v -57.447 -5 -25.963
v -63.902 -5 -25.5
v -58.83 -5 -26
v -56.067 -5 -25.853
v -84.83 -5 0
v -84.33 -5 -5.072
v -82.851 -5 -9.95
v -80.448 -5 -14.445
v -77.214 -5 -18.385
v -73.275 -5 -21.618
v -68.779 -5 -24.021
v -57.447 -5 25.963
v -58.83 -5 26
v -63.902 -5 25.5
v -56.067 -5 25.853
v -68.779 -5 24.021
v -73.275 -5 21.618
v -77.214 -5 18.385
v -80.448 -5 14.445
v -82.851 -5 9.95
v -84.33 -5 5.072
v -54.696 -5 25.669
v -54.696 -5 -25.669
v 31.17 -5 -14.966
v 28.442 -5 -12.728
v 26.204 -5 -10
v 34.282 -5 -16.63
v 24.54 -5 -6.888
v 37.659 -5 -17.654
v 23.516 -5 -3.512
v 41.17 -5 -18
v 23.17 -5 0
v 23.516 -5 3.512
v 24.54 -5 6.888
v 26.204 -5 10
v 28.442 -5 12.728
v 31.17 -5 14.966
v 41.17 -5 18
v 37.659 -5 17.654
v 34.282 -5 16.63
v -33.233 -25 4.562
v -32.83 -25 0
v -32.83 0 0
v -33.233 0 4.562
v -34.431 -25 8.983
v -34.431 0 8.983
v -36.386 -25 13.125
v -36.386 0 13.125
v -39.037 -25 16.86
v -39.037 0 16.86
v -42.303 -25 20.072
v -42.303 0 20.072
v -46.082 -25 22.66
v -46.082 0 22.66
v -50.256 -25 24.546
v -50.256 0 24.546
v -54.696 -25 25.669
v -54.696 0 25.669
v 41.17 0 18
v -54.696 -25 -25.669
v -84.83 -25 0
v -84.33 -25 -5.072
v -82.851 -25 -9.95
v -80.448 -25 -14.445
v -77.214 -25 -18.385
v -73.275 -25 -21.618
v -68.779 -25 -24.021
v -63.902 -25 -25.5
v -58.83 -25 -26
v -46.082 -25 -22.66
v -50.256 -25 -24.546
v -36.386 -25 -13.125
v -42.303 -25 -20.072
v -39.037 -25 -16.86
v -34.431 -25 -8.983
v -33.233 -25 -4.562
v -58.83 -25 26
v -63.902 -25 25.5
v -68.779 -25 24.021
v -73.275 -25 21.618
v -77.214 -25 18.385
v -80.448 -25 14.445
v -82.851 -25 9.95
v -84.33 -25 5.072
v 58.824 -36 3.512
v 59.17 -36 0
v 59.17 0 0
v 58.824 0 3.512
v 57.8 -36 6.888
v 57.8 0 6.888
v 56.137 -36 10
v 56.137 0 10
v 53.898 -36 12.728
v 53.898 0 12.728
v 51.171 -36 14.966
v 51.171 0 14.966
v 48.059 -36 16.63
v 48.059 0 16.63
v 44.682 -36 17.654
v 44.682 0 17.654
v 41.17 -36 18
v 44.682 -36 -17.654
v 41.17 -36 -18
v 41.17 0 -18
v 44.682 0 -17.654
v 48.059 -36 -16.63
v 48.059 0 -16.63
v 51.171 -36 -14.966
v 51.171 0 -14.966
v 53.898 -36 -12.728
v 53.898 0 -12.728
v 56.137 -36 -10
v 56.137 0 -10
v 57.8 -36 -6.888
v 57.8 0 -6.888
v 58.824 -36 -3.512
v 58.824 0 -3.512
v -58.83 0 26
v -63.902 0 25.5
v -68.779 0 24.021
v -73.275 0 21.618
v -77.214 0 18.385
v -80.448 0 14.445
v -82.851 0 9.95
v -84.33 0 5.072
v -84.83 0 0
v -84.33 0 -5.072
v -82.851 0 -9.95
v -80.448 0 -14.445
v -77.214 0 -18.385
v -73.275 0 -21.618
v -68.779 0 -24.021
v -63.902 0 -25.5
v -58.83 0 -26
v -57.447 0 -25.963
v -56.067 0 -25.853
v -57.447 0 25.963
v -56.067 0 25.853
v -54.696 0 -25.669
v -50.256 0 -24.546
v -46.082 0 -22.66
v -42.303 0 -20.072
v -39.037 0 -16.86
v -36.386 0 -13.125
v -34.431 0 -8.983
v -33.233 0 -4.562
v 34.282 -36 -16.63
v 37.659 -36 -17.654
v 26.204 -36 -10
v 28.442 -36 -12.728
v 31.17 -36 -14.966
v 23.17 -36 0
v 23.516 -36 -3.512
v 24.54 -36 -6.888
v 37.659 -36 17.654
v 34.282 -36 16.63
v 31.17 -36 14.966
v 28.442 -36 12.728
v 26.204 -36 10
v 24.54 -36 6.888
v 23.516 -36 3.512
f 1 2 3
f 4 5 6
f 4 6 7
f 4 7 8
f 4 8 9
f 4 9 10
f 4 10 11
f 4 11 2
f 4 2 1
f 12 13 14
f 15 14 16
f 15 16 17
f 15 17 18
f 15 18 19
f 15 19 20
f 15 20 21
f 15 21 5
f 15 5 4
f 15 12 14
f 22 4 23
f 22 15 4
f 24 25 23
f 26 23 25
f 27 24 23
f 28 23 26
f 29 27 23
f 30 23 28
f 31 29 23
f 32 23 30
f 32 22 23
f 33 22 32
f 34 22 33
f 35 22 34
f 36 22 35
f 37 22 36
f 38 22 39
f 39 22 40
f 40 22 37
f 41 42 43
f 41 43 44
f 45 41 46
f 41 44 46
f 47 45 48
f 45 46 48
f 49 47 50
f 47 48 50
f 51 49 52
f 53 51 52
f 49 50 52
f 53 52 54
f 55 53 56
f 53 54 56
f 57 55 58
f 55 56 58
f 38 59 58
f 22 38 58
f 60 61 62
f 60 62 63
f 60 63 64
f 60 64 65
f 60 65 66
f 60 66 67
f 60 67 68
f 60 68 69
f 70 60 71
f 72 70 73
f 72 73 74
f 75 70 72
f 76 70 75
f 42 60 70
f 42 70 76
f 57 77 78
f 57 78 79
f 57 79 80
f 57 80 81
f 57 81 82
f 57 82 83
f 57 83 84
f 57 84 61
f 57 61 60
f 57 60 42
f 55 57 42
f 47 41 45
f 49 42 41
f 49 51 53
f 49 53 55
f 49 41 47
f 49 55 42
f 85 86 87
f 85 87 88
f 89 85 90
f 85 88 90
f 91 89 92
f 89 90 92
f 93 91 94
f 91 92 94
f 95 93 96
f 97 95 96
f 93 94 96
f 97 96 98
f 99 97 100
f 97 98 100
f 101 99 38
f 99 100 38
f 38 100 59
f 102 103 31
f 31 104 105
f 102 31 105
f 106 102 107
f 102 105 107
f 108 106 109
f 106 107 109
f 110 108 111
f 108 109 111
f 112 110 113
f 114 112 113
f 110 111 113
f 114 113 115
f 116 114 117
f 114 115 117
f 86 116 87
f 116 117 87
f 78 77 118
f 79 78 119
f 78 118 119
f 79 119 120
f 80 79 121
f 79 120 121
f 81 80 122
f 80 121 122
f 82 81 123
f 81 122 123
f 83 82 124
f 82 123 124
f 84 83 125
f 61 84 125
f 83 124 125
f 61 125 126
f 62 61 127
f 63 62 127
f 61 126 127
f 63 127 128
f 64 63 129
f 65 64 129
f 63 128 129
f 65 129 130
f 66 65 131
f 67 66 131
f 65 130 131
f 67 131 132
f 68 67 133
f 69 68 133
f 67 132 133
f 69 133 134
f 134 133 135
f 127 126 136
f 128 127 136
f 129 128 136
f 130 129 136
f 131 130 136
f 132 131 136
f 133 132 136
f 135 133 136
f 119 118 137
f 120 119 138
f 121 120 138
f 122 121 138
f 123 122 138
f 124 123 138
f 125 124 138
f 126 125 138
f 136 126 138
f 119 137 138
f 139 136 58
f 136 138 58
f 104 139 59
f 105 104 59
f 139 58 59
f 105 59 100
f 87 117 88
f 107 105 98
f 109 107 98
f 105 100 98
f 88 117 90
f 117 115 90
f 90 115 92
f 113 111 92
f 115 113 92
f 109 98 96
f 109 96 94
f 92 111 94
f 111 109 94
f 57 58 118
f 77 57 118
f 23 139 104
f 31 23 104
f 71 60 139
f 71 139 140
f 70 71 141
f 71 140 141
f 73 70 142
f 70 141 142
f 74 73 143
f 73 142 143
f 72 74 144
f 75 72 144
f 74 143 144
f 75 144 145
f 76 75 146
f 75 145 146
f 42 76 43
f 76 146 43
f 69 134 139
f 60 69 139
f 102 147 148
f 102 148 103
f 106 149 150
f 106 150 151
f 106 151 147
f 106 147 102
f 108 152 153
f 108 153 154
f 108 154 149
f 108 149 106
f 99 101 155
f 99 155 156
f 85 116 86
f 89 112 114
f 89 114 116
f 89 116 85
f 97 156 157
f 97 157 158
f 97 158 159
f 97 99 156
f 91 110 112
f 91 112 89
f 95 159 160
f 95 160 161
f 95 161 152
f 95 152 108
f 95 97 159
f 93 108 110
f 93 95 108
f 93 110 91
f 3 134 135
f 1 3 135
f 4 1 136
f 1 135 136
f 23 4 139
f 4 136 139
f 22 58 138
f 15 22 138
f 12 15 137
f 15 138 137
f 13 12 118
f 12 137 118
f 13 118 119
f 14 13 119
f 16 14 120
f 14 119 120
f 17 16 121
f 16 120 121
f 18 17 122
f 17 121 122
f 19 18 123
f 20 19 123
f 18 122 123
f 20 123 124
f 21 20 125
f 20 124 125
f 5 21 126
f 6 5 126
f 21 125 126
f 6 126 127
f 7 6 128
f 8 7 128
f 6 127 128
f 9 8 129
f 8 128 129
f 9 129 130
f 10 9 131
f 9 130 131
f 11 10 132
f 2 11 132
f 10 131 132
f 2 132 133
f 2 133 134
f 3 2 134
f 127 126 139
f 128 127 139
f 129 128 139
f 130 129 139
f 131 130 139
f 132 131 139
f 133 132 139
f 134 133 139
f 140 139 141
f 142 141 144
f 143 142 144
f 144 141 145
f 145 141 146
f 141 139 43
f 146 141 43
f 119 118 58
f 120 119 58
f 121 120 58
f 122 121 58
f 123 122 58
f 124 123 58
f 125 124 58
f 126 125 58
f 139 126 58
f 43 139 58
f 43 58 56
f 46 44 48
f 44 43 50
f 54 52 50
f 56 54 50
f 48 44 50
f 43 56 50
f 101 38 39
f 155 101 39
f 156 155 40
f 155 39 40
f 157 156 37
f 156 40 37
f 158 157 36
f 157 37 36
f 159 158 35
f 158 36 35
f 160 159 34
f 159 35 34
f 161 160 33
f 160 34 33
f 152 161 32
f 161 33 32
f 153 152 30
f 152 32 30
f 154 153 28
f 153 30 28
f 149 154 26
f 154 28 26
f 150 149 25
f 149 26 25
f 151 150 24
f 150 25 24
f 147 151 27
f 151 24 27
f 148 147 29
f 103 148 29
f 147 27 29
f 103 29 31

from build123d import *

# Parameters (mm, degrees)
F1_DEPTH = 25
F2_DEPTH = 5
F3_DEPTH = 36


with BuildPart() as f1:
    # F0 (on Front) → F1 (new body)
    with BuildSketch(Plane.XZ):
        with BuildLine():
            Line((-54.696154, 25.669316), (-58.8297, 26))
            ThreePointArc((-58.8297, 26), (-84.8297, 0), (-58.8297, -26))
            Line((-58.8297, -26), (-54.696154, -25.669316))
            ThreePointArc((-54.696154, -25.669316), (-39.037376, -16.860128), (-32.8297, 0))
            ThreePointArc((-32.8297, 0), (-39.037376, 16.860128), (-54.696154, 25.669316))
        make_face()
    extrude(amount=F1_DEPTH)


with BuildPart() as f2:
    # F0 (on Front) → F2 (new body)
    with BuildSketch(Plane.XZ):
        with BuildLine():
            Line((-54.696154, 25.669316), (-58.8297, 26))
            ThreePointArc((-58.8297, 26), (-84.8297, 0), (-58.8297, -26))
            Line((-58.8297, -26), (-54.696154, -25.669316))
            ThreePointArc((-54.696154, -25.669316), (-39.037376, -16.860128), (-32.8297, 0))
            ThreePointArc((-32.8297, 0), (-39.037376, 16.860128), (-54.696154, 25.669316))
        make_face()
        with BuildLine():
            ThreePointArc((-54.696154, 25.669316), (-56.756324, 25.917197), (-58.8297, 26))
            Line((-58.8297, 26), (-54.696154, 25.669316))
        make_face()
        with BuildLine():
            Line((-54.696154, -25.669316), (-58.8297, -26))
            ThreePointArc((-58.8297, -26), (-56.756324, -25.917197), (-54.696154, -25.669316))
        make_face()
        with BuildLine():
            Line((41.1703, 18), (-54.696154, 25.669316))
            ThreePointArc((-54.696154, 25.669316), (-39.037376, 16.860128), (-32.8297, 0))
            ThreePointArc((-32.8297, 0), (-39.037376, -16.860128), (-54.696154, -25.669316))
            Line((-54.696154, -25.669316), (41.1703, -18))
            ThreePointArc((41.1703, -18), (23.1703, 0), (41.1703, 18))
        make_face()
        with BuildLine():
            ThreePointArc((59.1703, 0), (53.898222, 12.727922), (41.1703, 18))
            ThreePointArc((41.1703, 18), (23.1703, 0), (41.1703, -18))
            ThreePointArc((41.1703, -18), (53.898222, -12.727922), (59.1703, 0))
        make_face()
    extrude(amount=F2_DEPTH)

    # F0 (on Front) → F3 (join)
    with BuildSketch(Plane.XZ):
        with BuildLine():
            ThreePointArc((59.1703, 0), (53.898222, 12.727922), (41.1703, 18))
            ThreePointArc((41.1703, 18), (23.1703, 0), (41.1703, -18))
            ThreePointArc((41.1703, -18), (53.898222, -12.727922), (59.1703, 0))
        make_face()
    extrude(amount=F3_DEPTH)


solid = Compound([f1.part, f2.part])
